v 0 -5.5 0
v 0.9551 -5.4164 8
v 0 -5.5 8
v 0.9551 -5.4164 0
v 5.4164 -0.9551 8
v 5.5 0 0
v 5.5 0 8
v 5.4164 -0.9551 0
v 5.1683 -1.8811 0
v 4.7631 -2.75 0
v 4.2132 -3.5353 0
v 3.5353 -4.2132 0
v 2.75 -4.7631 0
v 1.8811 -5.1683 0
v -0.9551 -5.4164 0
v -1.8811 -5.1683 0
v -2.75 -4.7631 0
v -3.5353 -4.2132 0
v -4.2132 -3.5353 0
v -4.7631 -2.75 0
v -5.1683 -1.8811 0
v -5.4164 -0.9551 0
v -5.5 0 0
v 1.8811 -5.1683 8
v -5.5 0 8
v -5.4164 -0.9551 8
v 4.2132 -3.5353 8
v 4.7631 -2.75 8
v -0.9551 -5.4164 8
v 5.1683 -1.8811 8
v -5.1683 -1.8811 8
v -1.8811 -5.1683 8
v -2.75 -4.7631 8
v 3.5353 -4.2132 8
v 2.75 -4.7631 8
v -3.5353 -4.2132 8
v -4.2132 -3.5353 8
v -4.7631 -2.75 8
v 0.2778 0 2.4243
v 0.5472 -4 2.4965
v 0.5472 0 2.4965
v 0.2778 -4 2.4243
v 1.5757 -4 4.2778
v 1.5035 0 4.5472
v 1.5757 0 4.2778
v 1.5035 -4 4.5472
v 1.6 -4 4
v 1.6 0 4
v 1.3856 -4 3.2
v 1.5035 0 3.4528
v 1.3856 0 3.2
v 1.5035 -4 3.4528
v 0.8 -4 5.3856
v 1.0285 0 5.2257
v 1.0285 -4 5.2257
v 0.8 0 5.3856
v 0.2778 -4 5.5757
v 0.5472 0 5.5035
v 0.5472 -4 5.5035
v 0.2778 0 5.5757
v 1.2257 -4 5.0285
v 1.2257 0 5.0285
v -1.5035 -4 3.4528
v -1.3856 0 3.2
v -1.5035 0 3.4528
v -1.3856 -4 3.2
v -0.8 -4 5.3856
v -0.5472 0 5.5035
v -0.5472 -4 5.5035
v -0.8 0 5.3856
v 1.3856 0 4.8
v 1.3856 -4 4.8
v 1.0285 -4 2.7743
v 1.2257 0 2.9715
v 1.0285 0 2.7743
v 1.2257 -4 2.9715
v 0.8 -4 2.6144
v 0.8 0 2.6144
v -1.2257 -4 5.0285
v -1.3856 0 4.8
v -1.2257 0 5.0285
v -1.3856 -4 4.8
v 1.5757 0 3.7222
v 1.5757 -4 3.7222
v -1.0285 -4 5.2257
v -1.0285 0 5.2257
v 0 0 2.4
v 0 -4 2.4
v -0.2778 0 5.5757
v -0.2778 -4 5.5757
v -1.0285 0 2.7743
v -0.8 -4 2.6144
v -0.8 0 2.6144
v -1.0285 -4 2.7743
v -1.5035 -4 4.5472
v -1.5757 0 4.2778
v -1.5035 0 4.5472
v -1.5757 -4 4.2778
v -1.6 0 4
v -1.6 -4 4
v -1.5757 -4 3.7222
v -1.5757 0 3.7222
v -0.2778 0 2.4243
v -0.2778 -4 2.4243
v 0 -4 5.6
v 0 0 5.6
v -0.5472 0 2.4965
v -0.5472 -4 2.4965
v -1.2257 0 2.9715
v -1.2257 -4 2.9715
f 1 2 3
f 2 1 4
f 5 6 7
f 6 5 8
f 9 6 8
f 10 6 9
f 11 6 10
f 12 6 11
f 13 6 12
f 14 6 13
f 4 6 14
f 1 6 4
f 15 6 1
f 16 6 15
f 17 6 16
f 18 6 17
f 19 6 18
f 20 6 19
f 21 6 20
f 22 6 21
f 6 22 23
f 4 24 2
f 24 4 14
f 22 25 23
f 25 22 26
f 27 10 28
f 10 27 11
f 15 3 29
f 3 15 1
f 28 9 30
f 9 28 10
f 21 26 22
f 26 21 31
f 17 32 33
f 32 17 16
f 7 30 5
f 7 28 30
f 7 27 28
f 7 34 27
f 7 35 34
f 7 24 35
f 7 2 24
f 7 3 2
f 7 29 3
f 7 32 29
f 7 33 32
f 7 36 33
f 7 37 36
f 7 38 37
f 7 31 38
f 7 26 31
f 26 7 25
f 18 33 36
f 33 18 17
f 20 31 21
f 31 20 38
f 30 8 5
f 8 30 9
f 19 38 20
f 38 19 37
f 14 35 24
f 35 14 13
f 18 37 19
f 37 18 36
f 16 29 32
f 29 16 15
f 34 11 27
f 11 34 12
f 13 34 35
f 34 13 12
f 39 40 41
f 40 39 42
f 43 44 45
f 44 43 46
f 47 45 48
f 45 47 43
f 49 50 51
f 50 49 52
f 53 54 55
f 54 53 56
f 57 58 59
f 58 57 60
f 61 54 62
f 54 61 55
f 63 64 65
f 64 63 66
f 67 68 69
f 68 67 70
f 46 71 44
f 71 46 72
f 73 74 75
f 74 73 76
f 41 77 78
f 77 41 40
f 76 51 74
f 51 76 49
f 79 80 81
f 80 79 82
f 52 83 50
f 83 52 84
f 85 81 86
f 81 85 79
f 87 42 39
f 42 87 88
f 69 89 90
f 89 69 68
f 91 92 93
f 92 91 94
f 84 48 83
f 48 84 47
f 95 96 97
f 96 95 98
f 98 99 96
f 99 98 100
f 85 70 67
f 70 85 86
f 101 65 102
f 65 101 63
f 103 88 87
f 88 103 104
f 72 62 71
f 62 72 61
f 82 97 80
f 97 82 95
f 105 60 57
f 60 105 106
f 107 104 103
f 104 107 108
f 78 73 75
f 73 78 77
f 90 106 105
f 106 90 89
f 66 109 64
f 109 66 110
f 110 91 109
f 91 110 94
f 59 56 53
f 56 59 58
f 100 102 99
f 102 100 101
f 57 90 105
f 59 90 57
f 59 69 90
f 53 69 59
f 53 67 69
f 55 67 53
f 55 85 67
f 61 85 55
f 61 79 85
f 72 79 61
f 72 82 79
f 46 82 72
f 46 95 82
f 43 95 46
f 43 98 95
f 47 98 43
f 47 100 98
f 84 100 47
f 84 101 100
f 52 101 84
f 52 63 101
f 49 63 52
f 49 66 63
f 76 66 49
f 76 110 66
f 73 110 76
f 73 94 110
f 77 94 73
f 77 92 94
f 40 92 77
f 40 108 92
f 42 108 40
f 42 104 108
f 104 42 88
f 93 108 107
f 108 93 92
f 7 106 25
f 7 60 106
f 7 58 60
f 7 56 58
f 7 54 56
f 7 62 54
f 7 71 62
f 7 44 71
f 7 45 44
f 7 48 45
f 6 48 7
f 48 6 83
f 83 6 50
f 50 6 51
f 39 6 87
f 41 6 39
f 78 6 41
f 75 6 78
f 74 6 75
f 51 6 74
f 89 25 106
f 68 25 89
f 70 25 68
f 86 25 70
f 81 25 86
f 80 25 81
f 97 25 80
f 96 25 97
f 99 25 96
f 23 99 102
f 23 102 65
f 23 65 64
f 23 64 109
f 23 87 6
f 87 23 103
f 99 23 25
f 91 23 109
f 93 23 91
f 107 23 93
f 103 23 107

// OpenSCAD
$fn=36;
difference() {
cylinder (d=11,h=8);
translate ([0,0,4])
rotate ([90,0,0])
cylinder (d=3.2, h=8, center = true);
translate ([0,11/2,11/2])
cube(11, center = true);
}
